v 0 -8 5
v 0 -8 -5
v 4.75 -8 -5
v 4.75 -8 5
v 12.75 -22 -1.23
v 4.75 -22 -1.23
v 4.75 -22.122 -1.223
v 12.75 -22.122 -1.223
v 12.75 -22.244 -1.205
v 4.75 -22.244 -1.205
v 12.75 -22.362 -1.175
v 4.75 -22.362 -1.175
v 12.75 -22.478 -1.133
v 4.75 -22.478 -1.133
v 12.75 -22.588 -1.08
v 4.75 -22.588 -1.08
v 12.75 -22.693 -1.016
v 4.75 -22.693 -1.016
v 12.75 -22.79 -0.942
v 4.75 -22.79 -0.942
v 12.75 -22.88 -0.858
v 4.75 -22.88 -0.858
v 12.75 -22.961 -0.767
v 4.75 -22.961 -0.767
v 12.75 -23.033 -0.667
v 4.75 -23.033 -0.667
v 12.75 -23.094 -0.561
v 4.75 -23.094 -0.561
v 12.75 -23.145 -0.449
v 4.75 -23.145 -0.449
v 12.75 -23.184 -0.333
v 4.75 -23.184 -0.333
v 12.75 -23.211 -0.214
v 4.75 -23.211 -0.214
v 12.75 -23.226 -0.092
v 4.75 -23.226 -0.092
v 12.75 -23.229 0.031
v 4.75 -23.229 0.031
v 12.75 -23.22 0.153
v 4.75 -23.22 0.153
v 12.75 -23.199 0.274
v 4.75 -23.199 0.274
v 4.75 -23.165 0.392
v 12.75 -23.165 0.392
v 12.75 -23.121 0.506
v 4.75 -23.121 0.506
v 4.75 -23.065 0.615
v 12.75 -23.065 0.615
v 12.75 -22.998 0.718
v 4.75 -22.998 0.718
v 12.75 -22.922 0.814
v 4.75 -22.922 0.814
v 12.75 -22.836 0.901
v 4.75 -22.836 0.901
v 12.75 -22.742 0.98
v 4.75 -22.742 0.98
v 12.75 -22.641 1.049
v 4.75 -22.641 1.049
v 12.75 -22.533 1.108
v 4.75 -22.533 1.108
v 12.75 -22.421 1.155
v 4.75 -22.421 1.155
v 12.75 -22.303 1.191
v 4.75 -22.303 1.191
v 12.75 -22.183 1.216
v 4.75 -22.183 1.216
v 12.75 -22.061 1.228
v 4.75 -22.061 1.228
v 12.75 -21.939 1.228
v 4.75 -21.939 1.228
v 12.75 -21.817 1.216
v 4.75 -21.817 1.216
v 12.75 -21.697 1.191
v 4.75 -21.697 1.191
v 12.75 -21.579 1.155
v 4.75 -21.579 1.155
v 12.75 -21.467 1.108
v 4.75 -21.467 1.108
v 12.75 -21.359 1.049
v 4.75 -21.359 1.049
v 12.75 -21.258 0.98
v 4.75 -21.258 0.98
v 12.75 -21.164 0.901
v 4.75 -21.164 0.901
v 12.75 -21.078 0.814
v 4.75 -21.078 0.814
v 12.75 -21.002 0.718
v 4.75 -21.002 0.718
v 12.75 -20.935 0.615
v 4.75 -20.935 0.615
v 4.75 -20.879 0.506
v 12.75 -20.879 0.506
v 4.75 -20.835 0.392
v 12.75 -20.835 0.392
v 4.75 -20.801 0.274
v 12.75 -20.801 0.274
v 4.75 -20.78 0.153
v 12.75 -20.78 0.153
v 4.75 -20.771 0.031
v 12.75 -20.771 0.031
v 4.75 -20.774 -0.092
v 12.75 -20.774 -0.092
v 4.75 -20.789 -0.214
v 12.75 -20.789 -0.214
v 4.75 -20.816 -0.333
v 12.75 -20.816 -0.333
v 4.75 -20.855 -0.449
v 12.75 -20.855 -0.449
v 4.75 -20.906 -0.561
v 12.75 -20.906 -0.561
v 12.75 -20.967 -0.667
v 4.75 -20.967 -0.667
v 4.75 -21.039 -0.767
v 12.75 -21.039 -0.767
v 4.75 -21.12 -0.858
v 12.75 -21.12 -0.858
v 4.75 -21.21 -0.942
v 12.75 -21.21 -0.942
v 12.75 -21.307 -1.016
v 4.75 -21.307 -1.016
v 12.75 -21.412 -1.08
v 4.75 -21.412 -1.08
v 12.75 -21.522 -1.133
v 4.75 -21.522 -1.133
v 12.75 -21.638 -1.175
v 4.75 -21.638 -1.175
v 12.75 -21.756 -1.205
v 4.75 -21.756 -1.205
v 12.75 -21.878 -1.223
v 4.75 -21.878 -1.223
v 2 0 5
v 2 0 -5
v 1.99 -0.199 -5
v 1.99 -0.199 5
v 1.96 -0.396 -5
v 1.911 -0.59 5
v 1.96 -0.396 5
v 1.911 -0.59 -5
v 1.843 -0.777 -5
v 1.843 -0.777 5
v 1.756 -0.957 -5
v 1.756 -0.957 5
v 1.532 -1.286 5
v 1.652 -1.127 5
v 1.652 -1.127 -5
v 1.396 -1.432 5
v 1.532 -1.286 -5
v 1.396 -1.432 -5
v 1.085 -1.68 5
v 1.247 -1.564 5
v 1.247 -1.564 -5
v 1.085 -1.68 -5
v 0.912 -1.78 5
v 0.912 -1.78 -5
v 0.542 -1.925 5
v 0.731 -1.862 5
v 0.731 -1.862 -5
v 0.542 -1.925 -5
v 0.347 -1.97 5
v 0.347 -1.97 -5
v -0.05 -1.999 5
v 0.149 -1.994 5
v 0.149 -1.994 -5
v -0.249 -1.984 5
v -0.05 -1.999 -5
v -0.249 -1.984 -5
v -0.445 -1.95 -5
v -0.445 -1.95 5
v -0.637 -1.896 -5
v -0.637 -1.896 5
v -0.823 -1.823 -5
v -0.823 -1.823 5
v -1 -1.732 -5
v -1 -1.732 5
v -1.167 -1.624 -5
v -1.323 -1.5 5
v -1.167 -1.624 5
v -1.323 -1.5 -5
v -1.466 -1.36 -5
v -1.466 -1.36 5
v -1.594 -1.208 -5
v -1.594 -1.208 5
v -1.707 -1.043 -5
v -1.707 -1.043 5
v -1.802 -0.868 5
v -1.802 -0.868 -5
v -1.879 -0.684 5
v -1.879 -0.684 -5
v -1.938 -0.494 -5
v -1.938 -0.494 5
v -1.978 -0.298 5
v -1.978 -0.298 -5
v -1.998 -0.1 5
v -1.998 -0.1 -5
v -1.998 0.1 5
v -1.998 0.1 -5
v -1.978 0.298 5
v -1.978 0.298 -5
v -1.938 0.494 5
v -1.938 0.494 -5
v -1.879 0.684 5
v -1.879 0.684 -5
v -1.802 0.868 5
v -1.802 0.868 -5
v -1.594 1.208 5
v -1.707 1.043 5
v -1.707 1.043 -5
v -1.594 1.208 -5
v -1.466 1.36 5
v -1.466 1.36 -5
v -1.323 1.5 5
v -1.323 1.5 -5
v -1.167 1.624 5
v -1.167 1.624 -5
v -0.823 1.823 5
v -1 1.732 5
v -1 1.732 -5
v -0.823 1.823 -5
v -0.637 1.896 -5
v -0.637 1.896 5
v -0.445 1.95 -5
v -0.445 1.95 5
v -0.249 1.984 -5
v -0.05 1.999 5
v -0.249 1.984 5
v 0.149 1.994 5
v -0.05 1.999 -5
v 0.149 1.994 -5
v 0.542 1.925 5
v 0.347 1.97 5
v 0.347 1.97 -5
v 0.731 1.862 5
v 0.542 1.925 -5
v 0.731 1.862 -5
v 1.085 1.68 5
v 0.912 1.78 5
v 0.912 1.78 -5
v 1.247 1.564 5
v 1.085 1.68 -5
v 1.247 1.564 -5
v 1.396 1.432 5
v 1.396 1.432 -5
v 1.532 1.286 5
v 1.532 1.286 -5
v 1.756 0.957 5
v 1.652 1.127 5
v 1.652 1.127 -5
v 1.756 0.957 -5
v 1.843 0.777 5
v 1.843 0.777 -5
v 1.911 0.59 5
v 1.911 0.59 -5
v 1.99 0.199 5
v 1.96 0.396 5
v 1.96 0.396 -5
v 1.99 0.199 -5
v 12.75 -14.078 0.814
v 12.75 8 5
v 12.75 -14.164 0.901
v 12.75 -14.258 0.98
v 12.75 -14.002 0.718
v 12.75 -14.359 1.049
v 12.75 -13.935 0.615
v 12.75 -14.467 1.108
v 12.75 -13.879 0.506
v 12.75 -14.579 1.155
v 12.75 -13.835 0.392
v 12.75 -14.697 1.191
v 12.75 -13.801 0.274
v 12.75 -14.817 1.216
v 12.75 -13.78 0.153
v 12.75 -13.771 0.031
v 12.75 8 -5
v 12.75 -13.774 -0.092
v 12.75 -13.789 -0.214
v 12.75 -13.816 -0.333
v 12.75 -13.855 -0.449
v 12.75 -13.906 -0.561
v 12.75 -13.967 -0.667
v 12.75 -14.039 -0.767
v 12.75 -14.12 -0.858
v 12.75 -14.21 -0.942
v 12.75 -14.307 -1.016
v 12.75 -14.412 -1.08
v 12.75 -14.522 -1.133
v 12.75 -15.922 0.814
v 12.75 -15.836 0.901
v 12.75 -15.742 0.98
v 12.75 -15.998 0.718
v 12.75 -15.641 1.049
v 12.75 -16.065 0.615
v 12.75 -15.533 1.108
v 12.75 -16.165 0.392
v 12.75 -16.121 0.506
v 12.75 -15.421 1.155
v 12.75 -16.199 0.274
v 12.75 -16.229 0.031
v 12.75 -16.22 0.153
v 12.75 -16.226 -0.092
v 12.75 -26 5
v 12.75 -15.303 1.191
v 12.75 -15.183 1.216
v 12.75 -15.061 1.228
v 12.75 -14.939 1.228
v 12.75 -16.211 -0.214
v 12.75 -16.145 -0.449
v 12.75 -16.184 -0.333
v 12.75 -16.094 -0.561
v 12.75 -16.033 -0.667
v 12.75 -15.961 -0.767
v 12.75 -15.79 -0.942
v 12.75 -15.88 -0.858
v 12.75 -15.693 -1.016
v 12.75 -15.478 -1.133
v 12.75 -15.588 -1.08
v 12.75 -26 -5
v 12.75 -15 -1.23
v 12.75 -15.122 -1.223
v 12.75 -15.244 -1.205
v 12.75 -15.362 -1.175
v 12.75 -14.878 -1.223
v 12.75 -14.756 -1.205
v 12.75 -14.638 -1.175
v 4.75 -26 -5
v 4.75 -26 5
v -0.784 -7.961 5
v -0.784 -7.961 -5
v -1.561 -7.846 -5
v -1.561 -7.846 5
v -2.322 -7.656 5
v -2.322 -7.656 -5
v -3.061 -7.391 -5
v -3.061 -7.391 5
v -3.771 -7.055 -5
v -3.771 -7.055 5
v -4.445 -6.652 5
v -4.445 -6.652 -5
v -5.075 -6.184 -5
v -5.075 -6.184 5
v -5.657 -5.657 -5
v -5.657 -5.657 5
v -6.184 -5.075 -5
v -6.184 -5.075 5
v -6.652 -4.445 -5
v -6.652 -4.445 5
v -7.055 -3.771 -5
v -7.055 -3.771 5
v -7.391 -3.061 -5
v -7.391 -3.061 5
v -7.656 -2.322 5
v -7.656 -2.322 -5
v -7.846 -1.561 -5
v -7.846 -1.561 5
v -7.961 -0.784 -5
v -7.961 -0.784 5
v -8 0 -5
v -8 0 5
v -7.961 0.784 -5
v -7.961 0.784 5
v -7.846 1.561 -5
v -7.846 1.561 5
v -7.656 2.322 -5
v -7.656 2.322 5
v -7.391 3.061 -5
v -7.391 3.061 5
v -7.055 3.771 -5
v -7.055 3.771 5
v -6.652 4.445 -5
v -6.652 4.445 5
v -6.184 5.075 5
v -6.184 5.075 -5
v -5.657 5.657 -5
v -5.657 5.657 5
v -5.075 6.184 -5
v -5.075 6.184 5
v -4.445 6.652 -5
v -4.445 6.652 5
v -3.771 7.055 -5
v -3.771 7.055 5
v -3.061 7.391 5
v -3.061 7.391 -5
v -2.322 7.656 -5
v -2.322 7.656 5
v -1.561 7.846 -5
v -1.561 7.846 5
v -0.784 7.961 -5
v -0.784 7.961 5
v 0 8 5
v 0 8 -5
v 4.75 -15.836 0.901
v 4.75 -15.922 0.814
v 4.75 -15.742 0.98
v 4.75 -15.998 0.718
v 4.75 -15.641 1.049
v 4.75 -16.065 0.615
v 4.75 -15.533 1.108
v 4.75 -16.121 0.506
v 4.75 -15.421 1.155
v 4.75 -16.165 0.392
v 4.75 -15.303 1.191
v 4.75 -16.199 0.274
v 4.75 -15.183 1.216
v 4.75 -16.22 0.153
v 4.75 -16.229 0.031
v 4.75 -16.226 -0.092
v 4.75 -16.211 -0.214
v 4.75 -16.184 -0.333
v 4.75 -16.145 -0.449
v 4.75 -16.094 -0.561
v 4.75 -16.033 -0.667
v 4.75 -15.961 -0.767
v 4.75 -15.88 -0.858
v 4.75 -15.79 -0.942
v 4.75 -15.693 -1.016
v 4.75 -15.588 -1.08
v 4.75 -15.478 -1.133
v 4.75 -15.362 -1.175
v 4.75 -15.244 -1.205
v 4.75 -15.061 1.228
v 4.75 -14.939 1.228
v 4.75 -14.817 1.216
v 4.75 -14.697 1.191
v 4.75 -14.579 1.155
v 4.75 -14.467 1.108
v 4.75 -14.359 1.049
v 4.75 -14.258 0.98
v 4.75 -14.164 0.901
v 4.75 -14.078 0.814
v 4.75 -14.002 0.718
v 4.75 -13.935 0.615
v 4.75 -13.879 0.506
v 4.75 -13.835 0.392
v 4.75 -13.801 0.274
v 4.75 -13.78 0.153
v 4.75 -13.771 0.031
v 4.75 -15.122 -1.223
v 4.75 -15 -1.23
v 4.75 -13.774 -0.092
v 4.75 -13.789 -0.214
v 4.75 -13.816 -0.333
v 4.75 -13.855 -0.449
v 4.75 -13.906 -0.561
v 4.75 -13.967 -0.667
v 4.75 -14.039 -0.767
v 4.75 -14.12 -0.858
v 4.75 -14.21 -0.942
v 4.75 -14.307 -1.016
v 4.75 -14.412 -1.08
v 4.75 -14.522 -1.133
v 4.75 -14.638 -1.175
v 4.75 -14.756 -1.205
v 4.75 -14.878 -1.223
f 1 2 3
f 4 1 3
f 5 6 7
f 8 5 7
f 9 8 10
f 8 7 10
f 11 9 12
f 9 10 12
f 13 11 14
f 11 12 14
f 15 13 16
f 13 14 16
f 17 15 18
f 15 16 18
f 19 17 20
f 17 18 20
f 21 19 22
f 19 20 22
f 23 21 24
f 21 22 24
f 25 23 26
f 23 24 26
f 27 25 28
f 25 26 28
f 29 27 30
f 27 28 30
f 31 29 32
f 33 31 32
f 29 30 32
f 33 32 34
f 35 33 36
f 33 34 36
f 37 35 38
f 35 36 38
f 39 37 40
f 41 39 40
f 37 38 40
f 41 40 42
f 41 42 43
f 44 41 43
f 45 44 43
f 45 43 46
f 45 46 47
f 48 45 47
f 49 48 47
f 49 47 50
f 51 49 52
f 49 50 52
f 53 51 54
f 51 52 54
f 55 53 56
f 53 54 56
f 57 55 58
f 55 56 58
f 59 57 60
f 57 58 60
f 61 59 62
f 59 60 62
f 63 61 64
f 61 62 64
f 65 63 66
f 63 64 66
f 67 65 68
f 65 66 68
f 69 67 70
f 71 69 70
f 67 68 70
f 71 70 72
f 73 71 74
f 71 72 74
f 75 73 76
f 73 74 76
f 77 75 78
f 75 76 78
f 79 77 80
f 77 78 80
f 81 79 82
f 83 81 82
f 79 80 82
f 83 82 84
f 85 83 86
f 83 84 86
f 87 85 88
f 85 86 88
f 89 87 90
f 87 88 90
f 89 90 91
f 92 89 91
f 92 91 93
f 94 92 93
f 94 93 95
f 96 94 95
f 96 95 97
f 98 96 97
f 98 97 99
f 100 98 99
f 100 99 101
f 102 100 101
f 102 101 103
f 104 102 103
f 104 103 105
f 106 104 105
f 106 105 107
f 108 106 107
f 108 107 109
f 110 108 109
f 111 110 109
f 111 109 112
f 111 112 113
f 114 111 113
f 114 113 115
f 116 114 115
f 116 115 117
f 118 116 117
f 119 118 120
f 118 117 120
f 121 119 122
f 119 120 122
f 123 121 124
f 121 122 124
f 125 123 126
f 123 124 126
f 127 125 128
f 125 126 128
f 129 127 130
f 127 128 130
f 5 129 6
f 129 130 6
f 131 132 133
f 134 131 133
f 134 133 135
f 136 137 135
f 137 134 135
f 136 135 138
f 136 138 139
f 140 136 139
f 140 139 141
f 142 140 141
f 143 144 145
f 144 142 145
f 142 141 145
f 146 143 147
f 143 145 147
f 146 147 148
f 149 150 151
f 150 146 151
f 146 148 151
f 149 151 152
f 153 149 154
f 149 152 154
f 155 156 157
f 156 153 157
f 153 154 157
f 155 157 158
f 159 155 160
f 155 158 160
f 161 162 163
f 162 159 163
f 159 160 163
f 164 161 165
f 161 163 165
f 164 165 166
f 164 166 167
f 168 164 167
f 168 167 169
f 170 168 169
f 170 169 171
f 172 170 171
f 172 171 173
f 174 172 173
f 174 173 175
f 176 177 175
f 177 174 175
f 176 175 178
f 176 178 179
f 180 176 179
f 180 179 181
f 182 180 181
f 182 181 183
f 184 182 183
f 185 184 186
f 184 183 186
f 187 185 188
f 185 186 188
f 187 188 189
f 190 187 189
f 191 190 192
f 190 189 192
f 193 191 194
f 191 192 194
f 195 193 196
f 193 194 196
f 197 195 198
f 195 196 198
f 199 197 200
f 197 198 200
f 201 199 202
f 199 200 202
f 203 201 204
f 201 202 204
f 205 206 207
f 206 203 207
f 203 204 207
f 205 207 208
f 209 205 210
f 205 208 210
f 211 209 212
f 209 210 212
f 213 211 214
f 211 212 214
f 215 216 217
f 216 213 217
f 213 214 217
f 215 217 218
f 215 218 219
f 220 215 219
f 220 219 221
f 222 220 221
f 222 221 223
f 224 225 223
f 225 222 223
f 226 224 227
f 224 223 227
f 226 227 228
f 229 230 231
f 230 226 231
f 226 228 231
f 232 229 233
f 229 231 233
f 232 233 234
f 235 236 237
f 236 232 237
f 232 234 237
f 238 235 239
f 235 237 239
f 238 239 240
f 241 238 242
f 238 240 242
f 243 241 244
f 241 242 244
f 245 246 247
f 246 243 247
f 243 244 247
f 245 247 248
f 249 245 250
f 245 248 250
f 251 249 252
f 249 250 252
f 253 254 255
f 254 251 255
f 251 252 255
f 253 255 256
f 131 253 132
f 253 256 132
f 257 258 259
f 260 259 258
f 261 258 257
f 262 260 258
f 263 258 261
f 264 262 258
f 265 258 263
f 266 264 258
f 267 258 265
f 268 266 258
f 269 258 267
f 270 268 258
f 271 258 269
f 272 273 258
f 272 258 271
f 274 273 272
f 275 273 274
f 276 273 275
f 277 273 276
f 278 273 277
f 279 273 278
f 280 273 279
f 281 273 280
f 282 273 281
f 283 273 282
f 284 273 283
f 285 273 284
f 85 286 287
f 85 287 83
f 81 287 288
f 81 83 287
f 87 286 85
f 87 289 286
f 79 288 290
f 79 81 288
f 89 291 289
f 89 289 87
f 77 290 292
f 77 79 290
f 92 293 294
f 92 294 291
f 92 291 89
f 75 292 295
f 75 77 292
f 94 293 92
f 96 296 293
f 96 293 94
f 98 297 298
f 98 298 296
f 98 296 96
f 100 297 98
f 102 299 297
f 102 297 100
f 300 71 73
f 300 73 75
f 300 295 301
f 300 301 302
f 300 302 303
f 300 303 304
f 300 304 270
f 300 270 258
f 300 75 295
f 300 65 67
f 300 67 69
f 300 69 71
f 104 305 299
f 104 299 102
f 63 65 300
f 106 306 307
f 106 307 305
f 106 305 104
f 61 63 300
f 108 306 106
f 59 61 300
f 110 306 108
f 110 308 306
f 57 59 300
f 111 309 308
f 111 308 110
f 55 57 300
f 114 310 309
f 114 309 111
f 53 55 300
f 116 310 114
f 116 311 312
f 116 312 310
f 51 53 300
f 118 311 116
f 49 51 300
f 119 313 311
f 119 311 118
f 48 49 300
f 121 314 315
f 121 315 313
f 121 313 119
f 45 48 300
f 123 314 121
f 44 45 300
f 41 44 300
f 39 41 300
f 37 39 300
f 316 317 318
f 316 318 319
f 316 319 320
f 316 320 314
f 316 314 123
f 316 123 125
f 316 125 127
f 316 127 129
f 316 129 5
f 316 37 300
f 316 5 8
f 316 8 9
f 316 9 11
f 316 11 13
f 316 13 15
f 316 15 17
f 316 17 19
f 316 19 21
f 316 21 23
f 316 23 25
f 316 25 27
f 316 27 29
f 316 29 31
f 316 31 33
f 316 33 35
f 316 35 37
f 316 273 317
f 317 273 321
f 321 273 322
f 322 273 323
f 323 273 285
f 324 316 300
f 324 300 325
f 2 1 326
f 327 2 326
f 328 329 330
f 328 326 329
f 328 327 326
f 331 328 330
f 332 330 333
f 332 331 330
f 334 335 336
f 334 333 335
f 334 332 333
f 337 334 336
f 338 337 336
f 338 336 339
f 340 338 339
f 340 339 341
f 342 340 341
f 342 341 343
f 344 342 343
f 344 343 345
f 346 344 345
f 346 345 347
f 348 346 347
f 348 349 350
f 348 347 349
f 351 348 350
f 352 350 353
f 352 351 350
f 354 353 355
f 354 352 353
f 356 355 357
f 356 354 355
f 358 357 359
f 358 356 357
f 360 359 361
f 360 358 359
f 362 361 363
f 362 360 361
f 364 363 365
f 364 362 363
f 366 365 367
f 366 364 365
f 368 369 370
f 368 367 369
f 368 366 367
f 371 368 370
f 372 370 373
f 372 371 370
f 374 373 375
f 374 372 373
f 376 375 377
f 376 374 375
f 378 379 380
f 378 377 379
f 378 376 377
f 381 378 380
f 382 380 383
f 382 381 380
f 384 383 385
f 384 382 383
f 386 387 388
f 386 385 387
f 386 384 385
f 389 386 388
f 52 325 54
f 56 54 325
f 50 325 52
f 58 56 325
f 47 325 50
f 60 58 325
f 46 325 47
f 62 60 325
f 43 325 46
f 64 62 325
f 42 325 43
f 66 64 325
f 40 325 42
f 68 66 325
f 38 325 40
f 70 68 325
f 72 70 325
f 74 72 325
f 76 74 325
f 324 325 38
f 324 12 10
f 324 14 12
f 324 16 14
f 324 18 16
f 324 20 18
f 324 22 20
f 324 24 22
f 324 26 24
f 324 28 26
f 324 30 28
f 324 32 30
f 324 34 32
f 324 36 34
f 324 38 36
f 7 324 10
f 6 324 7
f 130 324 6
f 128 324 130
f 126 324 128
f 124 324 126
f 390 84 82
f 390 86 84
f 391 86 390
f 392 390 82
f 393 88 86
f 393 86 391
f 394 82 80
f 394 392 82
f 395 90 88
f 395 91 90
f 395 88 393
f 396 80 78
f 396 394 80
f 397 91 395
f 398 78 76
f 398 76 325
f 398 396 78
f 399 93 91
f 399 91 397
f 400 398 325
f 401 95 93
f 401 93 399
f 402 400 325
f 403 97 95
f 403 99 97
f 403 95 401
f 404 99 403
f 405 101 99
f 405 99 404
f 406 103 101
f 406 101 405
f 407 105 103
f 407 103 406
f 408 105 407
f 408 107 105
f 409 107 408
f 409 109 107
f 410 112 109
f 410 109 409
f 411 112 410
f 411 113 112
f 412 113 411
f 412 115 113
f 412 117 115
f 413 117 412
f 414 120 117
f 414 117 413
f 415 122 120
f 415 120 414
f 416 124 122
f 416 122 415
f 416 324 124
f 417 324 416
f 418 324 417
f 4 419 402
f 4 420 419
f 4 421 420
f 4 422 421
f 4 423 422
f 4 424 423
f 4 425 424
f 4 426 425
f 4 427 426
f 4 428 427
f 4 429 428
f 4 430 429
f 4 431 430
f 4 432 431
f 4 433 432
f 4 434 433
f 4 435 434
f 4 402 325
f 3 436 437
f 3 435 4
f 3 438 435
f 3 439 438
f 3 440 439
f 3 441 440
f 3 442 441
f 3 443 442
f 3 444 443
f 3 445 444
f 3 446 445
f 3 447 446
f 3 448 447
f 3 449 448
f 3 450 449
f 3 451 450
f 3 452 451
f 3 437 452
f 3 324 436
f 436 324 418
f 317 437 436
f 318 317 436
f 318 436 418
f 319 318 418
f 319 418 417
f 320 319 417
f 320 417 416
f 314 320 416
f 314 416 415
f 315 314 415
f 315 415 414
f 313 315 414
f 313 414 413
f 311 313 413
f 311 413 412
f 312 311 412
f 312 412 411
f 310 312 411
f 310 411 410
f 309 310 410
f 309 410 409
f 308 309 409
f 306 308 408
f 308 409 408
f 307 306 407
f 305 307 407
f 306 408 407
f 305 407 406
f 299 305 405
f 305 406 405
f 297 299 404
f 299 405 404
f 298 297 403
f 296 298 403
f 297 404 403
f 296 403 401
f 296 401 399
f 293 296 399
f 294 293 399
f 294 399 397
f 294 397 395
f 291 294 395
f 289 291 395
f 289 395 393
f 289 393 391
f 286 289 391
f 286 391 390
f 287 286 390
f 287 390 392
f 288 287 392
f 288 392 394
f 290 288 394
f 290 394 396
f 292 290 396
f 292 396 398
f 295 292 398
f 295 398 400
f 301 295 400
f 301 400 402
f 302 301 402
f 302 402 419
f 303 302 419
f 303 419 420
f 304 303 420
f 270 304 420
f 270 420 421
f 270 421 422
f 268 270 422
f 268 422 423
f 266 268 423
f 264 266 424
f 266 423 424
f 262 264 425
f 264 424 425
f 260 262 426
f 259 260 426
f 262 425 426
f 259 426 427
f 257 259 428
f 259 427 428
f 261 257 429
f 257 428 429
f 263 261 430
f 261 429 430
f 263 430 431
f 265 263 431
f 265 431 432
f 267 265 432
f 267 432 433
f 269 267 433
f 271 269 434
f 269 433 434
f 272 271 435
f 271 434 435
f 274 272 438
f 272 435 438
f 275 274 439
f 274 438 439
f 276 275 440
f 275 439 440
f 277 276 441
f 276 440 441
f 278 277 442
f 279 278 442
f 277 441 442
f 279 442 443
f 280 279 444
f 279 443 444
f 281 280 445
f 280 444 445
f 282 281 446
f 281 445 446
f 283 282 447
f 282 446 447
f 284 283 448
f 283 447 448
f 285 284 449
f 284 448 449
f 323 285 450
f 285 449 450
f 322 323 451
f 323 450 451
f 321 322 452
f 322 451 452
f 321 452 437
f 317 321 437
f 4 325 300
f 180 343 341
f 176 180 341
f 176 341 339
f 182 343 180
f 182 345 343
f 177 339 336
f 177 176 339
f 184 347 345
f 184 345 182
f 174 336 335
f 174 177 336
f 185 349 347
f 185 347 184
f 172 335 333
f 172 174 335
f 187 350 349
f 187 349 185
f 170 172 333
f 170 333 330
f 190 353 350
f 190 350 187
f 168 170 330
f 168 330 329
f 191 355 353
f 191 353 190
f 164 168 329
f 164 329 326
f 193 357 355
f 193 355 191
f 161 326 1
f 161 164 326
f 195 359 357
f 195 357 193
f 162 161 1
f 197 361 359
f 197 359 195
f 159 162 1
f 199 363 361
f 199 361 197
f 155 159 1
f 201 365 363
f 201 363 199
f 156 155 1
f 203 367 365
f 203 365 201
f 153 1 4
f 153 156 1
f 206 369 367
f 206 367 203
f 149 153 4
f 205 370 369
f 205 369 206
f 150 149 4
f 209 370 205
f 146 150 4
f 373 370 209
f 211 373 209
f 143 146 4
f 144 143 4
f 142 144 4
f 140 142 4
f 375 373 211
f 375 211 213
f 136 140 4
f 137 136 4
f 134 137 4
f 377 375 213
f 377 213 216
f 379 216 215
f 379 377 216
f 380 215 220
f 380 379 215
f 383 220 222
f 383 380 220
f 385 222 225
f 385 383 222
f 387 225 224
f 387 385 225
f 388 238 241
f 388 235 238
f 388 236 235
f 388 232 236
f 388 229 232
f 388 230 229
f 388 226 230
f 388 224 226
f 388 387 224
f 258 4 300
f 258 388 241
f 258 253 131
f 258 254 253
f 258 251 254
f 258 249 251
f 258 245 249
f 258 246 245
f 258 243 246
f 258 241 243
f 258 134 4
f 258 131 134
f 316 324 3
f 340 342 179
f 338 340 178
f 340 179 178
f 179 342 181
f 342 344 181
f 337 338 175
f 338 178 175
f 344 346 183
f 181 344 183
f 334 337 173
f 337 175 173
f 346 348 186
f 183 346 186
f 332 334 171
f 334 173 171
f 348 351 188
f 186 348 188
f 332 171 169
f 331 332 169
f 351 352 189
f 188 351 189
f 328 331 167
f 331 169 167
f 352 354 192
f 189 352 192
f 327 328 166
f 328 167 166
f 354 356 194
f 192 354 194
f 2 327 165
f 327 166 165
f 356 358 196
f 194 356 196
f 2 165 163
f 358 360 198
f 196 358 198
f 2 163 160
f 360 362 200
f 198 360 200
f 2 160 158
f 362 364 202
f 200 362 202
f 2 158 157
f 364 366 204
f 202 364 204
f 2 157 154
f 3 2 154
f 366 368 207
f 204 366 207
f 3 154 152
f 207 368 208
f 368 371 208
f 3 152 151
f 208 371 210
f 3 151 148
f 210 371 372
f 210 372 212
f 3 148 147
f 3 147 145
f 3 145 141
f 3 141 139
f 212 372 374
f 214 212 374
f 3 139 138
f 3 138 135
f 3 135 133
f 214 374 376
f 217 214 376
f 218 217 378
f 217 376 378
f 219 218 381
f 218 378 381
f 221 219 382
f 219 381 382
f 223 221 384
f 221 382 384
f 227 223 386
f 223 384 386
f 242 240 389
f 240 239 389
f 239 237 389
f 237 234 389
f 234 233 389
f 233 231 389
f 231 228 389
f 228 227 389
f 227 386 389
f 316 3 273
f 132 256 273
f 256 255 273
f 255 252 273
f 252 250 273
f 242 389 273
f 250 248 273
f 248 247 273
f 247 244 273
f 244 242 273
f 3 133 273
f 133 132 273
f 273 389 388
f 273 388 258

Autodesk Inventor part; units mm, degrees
ref_plane "YZ Plane" through (0, 0, 0) normal (1, 0, 0) x (0, 1, 0)
ref_plane "XZ Plane" through (0, 0, 0) normal (0, 1, 0) x (-1, 0, 0)
ref_plane "XY Plane" through (0, 0, 0) normal (0, 0, 1) x (1, 0, 0)
sketch "Sketch3" plane through (0, 0, 0) normal (0, 0, 1) x (1, 0, 0)
  circle A0 centre (0, 0) radius 2
  line L0 (0, 0) -> (12.75, 0)
  line L1 (12.75, 0) -> (12.75, -26)
  line L2 (12.75, -26) -> (4.75, -26)
  line L3 (4.75, -26) -> (4.75, -16)
  circle A1 centre (0, 0) radius 12.75
  line L4 (4.75, -16) -> (4.75, 8)
  line L5 (4.75, 8) -> (12.75, 8)
  line L6 (12.75, 8) -> (12.75, 0)
  circle A2 centre (0, 0) radius 8
  line L7 (0, -8) -> (4.75, -8)
  line L8 (0, 8) -> (4.75, 8)
  dimension "d29" = 4
  dimension "d30" = 12.75
  dimension "d31" = 26
  dimension "d32" = 8
  dimension "d33" = 10
  dimension "d34" = 8
extrude "Extrusion2" add sketch "Sketch3" along normal mid plane 10 contours A2 L4 L5 A1 L0 | A2 L4 L0 | L0 L4 A2 | L0 A1 L4 A2 | L1 L2 L3 L4 A1 | A1 L5 L6 | L4 A2 | A2 L8 L4 | L4 L7 A2
sketch "Sketch4" plane through (12.75, -26, 5) normal (1, 0, 0) x (0, 0, -1)
  line L0 (10, 0) -> (0, 0) projected
  point P0 (5, 26)
  point P1 (5, 4)
  point P2 (5, 11)
  dimension "d37" = 7
  dimension "d38" = 4
hole "Hole2" at (12.75, -22, 0) at (12.75, -15, 0) direction (-1, 0, 0) diameter 2.459 end through all thread size "M3x0.5" class "6H" standard "ISO Metric profile"
properties part number "CHUCKLENGAN"
